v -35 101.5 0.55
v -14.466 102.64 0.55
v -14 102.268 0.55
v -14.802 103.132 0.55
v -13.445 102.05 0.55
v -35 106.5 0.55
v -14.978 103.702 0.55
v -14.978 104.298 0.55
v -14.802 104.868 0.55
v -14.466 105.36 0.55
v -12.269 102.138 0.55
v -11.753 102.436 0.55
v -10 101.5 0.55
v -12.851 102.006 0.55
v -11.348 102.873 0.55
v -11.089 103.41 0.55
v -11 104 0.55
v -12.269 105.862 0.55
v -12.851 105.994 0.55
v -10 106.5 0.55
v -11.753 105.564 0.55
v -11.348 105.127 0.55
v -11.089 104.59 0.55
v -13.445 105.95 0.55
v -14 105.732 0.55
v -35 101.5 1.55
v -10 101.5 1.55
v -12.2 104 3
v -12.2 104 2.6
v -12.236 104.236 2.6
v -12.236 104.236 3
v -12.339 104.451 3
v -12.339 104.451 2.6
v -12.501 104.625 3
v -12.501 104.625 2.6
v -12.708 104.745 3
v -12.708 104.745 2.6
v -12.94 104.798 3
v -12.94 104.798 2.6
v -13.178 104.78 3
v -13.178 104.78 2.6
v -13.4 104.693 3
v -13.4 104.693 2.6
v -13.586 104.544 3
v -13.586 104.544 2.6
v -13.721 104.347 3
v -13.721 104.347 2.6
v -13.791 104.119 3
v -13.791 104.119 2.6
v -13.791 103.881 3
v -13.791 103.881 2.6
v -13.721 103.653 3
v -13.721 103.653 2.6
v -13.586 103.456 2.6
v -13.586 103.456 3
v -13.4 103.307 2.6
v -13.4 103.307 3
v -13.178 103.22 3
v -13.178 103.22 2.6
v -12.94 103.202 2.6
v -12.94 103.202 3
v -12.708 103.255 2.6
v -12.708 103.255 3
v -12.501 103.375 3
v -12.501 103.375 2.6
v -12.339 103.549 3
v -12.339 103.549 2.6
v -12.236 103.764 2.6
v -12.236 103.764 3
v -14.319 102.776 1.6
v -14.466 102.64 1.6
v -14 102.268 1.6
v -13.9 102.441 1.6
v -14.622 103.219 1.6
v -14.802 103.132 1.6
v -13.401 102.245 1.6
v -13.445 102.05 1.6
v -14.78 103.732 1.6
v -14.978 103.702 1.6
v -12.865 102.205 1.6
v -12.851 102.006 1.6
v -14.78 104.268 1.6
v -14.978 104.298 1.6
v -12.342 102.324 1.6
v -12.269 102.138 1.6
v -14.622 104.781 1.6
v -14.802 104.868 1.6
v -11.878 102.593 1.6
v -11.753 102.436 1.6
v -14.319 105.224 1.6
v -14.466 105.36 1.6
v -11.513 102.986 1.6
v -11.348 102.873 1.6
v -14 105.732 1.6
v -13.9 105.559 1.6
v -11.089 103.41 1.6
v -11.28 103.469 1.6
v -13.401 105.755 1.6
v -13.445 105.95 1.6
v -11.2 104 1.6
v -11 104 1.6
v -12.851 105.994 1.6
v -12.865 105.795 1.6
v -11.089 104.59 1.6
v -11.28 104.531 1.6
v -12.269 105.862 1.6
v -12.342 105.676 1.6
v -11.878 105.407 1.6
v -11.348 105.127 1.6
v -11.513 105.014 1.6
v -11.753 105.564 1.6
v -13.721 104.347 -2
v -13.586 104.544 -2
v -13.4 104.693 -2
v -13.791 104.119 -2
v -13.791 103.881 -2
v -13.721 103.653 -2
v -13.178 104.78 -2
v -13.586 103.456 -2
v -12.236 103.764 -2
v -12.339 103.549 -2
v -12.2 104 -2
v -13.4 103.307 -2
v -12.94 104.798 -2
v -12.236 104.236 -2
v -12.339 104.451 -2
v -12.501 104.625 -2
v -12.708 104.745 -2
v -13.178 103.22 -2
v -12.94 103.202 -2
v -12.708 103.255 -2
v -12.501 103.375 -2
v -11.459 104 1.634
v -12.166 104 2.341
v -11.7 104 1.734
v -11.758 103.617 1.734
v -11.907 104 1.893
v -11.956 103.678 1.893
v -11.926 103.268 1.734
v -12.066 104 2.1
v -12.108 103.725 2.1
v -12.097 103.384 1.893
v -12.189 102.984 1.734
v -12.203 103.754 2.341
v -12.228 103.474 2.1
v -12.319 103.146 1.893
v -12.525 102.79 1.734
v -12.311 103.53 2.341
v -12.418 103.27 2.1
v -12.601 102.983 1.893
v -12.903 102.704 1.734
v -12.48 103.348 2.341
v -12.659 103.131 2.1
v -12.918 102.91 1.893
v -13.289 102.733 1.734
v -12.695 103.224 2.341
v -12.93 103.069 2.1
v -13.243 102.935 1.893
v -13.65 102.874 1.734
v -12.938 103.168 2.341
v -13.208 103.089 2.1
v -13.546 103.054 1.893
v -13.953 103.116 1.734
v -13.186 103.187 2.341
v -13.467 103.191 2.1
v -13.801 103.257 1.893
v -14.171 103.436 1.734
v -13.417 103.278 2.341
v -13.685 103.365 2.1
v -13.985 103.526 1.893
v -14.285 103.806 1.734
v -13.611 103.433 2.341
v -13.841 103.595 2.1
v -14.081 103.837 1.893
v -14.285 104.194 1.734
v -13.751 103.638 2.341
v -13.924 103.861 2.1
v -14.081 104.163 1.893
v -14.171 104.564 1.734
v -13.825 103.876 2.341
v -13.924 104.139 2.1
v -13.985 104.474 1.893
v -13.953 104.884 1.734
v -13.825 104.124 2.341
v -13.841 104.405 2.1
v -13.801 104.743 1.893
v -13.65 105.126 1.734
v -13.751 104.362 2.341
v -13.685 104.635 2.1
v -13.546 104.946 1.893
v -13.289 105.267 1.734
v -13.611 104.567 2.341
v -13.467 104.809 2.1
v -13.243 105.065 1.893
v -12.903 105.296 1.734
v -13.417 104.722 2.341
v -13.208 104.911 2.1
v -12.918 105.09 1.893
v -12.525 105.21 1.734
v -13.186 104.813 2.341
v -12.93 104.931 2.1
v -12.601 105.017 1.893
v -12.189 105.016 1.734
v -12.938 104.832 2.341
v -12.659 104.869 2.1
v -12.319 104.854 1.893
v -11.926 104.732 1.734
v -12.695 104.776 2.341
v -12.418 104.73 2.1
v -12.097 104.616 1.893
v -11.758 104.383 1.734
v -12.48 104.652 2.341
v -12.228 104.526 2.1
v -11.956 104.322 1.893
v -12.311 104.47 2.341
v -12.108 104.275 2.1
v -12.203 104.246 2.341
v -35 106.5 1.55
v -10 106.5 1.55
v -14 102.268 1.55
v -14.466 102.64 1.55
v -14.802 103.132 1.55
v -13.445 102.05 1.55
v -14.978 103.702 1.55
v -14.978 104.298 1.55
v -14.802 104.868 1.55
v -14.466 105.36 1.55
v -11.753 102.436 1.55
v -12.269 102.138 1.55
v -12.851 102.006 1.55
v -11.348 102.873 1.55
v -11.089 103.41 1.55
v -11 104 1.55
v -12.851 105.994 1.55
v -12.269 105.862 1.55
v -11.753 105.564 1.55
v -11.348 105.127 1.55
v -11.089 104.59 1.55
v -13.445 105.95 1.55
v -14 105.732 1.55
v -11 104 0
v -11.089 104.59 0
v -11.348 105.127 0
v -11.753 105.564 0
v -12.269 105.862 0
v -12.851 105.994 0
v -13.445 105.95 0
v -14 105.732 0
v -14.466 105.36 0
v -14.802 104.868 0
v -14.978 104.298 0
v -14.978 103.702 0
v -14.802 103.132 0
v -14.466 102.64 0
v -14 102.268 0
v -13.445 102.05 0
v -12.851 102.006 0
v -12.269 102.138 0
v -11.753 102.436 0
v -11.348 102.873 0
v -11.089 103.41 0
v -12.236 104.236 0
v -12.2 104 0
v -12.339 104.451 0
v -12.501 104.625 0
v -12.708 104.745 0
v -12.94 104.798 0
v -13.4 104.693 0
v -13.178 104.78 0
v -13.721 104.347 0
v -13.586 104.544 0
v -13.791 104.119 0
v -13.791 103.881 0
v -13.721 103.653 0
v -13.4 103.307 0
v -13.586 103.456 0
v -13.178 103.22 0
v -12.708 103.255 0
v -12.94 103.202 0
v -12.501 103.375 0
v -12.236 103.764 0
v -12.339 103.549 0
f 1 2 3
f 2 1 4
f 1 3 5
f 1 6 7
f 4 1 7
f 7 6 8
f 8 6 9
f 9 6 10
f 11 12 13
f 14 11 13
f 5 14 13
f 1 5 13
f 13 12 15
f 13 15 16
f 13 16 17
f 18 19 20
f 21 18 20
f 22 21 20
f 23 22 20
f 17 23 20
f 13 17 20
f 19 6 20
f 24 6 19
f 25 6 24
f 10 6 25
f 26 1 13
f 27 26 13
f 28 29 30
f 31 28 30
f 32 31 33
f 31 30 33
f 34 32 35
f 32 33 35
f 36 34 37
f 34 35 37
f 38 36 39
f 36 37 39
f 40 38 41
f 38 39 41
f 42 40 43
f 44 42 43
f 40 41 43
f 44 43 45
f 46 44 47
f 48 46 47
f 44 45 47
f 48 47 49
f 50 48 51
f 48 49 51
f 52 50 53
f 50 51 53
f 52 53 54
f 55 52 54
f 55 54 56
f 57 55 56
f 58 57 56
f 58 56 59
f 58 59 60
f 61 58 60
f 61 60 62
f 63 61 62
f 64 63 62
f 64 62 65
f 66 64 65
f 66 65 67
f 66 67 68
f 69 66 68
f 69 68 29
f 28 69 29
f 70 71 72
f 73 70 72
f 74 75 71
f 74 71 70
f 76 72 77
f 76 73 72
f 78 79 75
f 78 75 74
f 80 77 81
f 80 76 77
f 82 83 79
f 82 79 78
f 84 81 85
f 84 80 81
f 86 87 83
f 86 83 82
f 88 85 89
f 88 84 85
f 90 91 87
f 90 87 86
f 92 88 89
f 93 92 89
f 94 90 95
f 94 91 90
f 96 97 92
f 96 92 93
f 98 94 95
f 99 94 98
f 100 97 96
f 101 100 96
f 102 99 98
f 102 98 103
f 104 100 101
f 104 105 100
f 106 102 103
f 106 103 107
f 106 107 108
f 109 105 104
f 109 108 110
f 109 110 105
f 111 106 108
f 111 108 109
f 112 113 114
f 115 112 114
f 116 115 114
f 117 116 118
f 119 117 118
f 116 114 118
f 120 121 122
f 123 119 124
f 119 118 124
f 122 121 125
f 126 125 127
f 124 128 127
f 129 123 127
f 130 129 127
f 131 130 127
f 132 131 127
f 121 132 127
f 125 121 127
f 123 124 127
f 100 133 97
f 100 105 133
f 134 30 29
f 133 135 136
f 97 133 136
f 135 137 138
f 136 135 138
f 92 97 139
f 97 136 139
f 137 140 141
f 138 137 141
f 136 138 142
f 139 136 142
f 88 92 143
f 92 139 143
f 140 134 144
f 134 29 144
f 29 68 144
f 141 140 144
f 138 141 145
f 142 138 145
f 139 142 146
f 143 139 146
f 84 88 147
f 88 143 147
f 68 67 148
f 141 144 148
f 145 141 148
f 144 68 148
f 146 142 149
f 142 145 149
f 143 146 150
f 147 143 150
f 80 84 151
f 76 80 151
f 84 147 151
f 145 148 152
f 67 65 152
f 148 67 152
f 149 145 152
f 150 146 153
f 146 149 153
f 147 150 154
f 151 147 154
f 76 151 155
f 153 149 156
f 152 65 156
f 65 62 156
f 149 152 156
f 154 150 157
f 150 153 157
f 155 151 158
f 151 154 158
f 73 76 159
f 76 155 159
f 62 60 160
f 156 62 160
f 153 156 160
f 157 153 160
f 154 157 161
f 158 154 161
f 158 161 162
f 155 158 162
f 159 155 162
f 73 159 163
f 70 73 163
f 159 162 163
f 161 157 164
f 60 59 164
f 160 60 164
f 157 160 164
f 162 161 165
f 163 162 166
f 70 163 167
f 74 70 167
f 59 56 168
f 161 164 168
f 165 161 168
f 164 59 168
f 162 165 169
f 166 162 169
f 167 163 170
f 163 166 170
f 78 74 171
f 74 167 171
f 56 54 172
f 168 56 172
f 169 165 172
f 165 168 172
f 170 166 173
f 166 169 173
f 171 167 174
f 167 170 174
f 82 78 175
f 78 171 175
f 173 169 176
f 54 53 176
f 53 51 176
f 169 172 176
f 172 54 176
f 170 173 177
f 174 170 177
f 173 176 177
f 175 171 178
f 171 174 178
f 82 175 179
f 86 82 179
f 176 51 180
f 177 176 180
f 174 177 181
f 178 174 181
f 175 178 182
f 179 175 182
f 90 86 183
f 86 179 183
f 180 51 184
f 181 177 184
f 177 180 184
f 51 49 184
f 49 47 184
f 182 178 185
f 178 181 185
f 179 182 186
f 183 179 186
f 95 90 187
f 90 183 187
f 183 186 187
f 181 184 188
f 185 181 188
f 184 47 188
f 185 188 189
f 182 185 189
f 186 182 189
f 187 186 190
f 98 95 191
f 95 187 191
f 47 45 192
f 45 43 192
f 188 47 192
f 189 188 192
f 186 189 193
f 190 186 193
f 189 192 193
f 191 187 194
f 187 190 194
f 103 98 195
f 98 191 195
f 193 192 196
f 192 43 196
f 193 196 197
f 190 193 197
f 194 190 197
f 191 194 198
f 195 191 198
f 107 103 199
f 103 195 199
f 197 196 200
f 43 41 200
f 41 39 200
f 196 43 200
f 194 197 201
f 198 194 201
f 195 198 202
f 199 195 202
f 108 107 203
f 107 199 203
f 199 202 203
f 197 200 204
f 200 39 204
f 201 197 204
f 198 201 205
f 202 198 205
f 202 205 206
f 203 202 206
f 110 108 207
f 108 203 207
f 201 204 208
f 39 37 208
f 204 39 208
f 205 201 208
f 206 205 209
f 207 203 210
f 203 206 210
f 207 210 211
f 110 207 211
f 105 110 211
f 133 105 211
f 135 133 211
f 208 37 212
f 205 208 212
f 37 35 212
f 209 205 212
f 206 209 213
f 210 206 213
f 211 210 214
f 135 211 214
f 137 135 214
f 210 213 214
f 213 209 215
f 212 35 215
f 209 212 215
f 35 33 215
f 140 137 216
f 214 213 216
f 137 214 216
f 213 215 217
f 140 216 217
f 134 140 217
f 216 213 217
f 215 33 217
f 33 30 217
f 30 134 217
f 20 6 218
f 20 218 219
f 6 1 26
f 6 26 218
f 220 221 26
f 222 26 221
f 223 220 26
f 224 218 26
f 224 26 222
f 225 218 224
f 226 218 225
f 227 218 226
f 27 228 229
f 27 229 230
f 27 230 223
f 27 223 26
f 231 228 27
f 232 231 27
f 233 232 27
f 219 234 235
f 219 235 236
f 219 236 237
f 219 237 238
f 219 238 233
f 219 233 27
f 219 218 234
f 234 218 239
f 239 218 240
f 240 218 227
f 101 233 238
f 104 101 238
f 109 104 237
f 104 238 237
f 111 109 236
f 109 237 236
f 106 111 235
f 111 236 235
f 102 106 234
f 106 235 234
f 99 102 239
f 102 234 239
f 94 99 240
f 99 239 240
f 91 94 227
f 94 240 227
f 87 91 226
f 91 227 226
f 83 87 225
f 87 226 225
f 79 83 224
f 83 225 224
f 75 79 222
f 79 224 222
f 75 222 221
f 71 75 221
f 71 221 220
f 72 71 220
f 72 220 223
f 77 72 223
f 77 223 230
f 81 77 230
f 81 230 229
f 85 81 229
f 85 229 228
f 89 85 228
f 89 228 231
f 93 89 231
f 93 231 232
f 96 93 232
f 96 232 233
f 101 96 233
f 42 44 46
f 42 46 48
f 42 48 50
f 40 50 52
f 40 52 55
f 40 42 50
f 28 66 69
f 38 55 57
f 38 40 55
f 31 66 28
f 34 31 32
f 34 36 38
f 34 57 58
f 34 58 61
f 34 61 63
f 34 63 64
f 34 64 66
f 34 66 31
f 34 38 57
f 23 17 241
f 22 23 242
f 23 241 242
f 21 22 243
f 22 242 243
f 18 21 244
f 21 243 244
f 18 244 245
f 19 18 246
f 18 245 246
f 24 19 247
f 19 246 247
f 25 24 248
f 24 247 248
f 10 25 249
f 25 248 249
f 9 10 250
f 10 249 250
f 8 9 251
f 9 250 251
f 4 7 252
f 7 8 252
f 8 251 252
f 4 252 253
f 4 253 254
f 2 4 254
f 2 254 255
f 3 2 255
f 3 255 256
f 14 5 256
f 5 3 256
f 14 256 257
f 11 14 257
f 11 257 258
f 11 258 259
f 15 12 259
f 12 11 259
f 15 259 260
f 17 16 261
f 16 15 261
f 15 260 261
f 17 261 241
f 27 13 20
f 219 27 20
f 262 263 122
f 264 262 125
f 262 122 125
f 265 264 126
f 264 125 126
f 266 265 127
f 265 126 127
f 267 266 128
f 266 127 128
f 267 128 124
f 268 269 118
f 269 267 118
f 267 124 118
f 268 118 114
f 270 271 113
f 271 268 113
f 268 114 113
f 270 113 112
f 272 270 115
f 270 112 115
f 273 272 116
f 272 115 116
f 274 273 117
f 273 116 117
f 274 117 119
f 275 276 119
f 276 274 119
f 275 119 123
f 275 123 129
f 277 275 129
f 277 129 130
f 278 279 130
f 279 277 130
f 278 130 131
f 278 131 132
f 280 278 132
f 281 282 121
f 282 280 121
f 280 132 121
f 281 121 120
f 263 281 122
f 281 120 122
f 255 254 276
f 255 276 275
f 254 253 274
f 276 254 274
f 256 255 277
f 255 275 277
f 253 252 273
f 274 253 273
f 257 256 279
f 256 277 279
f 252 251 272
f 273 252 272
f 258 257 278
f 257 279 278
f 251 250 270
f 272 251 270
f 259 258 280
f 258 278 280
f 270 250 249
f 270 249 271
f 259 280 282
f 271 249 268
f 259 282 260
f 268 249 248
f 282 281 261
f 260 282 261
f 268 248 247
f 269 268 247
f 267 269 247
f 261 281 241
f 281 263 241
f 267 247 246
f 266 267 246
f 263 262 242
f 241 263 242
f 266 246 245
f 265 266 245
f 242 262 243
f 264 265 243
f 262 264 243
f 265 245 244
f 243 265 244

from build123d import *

# Parameters (mm, degrees)
CYLINDER004_R     = 0.8
CYLINDER004_DEPTH = 5
CYLINDER006_R     = 2
CYLINDER006_DEPTH = 1.6
FILLET003_R       = 1
BOX006_W          = 25
BOX006_H          = 5
BOX006_DEPTH      = 1


with BuildPart() as cilindro004:
    # Cylinder004 → Cylinder004 (new body)
    with BuildSketch(Plane(origin=(-8, 104, -2), x_dir=(1, 0, 0), z_dir=(0, 0, 1))):
        Circle(CYLINDER004_R)
    extrude(amount=CYLINDER004_DEPTH)


with BuildPart() as fillet003:
    # Cylinder006 → Cylinder006 (new body)
    with BuildSketch(Plane(origin=(-8, 104, 0), x_dir=(1, 0, 0), z_dir=(0, 0, 1))):
        Circle(CYLINDER006_R)
    extrude(amount=CYLINDER006_DEPTH)

    # Fusion003: union Cilindro004
    add(cilindro004.part)

    # Fillet003
    fillet003_edges = [fillet003.edges().sort_by_distance(p)[0] for p in [
        (-8.8, 104, 1.6),
    ]]
    fillet(fillet003_edges, radius=FILLET003_R)


with BuildPart() as soldaduranegro:
    # Box006 → Box006 (new body)
    with BuildSketch(Plane(origin=(-30, 101.5, 0.55), x_dir=(1, 0, 0), z_dir=(0, 0, 1))):
        with Locations((12.5, 2.5)):
            Rectangle(BOX006_W, BOX006_H)
    extrude(amount=BOX006_DEPTH)

    # Fusion005: union Fillet003
    add(fillet003.part)


with BuildPart() as soldaduranegro_1:
    # Fusion005 placement: moved
    add(soldaduranegro.part.moved(Location((-5, 0, 0))))


solid = soldaduranegro_1.part
